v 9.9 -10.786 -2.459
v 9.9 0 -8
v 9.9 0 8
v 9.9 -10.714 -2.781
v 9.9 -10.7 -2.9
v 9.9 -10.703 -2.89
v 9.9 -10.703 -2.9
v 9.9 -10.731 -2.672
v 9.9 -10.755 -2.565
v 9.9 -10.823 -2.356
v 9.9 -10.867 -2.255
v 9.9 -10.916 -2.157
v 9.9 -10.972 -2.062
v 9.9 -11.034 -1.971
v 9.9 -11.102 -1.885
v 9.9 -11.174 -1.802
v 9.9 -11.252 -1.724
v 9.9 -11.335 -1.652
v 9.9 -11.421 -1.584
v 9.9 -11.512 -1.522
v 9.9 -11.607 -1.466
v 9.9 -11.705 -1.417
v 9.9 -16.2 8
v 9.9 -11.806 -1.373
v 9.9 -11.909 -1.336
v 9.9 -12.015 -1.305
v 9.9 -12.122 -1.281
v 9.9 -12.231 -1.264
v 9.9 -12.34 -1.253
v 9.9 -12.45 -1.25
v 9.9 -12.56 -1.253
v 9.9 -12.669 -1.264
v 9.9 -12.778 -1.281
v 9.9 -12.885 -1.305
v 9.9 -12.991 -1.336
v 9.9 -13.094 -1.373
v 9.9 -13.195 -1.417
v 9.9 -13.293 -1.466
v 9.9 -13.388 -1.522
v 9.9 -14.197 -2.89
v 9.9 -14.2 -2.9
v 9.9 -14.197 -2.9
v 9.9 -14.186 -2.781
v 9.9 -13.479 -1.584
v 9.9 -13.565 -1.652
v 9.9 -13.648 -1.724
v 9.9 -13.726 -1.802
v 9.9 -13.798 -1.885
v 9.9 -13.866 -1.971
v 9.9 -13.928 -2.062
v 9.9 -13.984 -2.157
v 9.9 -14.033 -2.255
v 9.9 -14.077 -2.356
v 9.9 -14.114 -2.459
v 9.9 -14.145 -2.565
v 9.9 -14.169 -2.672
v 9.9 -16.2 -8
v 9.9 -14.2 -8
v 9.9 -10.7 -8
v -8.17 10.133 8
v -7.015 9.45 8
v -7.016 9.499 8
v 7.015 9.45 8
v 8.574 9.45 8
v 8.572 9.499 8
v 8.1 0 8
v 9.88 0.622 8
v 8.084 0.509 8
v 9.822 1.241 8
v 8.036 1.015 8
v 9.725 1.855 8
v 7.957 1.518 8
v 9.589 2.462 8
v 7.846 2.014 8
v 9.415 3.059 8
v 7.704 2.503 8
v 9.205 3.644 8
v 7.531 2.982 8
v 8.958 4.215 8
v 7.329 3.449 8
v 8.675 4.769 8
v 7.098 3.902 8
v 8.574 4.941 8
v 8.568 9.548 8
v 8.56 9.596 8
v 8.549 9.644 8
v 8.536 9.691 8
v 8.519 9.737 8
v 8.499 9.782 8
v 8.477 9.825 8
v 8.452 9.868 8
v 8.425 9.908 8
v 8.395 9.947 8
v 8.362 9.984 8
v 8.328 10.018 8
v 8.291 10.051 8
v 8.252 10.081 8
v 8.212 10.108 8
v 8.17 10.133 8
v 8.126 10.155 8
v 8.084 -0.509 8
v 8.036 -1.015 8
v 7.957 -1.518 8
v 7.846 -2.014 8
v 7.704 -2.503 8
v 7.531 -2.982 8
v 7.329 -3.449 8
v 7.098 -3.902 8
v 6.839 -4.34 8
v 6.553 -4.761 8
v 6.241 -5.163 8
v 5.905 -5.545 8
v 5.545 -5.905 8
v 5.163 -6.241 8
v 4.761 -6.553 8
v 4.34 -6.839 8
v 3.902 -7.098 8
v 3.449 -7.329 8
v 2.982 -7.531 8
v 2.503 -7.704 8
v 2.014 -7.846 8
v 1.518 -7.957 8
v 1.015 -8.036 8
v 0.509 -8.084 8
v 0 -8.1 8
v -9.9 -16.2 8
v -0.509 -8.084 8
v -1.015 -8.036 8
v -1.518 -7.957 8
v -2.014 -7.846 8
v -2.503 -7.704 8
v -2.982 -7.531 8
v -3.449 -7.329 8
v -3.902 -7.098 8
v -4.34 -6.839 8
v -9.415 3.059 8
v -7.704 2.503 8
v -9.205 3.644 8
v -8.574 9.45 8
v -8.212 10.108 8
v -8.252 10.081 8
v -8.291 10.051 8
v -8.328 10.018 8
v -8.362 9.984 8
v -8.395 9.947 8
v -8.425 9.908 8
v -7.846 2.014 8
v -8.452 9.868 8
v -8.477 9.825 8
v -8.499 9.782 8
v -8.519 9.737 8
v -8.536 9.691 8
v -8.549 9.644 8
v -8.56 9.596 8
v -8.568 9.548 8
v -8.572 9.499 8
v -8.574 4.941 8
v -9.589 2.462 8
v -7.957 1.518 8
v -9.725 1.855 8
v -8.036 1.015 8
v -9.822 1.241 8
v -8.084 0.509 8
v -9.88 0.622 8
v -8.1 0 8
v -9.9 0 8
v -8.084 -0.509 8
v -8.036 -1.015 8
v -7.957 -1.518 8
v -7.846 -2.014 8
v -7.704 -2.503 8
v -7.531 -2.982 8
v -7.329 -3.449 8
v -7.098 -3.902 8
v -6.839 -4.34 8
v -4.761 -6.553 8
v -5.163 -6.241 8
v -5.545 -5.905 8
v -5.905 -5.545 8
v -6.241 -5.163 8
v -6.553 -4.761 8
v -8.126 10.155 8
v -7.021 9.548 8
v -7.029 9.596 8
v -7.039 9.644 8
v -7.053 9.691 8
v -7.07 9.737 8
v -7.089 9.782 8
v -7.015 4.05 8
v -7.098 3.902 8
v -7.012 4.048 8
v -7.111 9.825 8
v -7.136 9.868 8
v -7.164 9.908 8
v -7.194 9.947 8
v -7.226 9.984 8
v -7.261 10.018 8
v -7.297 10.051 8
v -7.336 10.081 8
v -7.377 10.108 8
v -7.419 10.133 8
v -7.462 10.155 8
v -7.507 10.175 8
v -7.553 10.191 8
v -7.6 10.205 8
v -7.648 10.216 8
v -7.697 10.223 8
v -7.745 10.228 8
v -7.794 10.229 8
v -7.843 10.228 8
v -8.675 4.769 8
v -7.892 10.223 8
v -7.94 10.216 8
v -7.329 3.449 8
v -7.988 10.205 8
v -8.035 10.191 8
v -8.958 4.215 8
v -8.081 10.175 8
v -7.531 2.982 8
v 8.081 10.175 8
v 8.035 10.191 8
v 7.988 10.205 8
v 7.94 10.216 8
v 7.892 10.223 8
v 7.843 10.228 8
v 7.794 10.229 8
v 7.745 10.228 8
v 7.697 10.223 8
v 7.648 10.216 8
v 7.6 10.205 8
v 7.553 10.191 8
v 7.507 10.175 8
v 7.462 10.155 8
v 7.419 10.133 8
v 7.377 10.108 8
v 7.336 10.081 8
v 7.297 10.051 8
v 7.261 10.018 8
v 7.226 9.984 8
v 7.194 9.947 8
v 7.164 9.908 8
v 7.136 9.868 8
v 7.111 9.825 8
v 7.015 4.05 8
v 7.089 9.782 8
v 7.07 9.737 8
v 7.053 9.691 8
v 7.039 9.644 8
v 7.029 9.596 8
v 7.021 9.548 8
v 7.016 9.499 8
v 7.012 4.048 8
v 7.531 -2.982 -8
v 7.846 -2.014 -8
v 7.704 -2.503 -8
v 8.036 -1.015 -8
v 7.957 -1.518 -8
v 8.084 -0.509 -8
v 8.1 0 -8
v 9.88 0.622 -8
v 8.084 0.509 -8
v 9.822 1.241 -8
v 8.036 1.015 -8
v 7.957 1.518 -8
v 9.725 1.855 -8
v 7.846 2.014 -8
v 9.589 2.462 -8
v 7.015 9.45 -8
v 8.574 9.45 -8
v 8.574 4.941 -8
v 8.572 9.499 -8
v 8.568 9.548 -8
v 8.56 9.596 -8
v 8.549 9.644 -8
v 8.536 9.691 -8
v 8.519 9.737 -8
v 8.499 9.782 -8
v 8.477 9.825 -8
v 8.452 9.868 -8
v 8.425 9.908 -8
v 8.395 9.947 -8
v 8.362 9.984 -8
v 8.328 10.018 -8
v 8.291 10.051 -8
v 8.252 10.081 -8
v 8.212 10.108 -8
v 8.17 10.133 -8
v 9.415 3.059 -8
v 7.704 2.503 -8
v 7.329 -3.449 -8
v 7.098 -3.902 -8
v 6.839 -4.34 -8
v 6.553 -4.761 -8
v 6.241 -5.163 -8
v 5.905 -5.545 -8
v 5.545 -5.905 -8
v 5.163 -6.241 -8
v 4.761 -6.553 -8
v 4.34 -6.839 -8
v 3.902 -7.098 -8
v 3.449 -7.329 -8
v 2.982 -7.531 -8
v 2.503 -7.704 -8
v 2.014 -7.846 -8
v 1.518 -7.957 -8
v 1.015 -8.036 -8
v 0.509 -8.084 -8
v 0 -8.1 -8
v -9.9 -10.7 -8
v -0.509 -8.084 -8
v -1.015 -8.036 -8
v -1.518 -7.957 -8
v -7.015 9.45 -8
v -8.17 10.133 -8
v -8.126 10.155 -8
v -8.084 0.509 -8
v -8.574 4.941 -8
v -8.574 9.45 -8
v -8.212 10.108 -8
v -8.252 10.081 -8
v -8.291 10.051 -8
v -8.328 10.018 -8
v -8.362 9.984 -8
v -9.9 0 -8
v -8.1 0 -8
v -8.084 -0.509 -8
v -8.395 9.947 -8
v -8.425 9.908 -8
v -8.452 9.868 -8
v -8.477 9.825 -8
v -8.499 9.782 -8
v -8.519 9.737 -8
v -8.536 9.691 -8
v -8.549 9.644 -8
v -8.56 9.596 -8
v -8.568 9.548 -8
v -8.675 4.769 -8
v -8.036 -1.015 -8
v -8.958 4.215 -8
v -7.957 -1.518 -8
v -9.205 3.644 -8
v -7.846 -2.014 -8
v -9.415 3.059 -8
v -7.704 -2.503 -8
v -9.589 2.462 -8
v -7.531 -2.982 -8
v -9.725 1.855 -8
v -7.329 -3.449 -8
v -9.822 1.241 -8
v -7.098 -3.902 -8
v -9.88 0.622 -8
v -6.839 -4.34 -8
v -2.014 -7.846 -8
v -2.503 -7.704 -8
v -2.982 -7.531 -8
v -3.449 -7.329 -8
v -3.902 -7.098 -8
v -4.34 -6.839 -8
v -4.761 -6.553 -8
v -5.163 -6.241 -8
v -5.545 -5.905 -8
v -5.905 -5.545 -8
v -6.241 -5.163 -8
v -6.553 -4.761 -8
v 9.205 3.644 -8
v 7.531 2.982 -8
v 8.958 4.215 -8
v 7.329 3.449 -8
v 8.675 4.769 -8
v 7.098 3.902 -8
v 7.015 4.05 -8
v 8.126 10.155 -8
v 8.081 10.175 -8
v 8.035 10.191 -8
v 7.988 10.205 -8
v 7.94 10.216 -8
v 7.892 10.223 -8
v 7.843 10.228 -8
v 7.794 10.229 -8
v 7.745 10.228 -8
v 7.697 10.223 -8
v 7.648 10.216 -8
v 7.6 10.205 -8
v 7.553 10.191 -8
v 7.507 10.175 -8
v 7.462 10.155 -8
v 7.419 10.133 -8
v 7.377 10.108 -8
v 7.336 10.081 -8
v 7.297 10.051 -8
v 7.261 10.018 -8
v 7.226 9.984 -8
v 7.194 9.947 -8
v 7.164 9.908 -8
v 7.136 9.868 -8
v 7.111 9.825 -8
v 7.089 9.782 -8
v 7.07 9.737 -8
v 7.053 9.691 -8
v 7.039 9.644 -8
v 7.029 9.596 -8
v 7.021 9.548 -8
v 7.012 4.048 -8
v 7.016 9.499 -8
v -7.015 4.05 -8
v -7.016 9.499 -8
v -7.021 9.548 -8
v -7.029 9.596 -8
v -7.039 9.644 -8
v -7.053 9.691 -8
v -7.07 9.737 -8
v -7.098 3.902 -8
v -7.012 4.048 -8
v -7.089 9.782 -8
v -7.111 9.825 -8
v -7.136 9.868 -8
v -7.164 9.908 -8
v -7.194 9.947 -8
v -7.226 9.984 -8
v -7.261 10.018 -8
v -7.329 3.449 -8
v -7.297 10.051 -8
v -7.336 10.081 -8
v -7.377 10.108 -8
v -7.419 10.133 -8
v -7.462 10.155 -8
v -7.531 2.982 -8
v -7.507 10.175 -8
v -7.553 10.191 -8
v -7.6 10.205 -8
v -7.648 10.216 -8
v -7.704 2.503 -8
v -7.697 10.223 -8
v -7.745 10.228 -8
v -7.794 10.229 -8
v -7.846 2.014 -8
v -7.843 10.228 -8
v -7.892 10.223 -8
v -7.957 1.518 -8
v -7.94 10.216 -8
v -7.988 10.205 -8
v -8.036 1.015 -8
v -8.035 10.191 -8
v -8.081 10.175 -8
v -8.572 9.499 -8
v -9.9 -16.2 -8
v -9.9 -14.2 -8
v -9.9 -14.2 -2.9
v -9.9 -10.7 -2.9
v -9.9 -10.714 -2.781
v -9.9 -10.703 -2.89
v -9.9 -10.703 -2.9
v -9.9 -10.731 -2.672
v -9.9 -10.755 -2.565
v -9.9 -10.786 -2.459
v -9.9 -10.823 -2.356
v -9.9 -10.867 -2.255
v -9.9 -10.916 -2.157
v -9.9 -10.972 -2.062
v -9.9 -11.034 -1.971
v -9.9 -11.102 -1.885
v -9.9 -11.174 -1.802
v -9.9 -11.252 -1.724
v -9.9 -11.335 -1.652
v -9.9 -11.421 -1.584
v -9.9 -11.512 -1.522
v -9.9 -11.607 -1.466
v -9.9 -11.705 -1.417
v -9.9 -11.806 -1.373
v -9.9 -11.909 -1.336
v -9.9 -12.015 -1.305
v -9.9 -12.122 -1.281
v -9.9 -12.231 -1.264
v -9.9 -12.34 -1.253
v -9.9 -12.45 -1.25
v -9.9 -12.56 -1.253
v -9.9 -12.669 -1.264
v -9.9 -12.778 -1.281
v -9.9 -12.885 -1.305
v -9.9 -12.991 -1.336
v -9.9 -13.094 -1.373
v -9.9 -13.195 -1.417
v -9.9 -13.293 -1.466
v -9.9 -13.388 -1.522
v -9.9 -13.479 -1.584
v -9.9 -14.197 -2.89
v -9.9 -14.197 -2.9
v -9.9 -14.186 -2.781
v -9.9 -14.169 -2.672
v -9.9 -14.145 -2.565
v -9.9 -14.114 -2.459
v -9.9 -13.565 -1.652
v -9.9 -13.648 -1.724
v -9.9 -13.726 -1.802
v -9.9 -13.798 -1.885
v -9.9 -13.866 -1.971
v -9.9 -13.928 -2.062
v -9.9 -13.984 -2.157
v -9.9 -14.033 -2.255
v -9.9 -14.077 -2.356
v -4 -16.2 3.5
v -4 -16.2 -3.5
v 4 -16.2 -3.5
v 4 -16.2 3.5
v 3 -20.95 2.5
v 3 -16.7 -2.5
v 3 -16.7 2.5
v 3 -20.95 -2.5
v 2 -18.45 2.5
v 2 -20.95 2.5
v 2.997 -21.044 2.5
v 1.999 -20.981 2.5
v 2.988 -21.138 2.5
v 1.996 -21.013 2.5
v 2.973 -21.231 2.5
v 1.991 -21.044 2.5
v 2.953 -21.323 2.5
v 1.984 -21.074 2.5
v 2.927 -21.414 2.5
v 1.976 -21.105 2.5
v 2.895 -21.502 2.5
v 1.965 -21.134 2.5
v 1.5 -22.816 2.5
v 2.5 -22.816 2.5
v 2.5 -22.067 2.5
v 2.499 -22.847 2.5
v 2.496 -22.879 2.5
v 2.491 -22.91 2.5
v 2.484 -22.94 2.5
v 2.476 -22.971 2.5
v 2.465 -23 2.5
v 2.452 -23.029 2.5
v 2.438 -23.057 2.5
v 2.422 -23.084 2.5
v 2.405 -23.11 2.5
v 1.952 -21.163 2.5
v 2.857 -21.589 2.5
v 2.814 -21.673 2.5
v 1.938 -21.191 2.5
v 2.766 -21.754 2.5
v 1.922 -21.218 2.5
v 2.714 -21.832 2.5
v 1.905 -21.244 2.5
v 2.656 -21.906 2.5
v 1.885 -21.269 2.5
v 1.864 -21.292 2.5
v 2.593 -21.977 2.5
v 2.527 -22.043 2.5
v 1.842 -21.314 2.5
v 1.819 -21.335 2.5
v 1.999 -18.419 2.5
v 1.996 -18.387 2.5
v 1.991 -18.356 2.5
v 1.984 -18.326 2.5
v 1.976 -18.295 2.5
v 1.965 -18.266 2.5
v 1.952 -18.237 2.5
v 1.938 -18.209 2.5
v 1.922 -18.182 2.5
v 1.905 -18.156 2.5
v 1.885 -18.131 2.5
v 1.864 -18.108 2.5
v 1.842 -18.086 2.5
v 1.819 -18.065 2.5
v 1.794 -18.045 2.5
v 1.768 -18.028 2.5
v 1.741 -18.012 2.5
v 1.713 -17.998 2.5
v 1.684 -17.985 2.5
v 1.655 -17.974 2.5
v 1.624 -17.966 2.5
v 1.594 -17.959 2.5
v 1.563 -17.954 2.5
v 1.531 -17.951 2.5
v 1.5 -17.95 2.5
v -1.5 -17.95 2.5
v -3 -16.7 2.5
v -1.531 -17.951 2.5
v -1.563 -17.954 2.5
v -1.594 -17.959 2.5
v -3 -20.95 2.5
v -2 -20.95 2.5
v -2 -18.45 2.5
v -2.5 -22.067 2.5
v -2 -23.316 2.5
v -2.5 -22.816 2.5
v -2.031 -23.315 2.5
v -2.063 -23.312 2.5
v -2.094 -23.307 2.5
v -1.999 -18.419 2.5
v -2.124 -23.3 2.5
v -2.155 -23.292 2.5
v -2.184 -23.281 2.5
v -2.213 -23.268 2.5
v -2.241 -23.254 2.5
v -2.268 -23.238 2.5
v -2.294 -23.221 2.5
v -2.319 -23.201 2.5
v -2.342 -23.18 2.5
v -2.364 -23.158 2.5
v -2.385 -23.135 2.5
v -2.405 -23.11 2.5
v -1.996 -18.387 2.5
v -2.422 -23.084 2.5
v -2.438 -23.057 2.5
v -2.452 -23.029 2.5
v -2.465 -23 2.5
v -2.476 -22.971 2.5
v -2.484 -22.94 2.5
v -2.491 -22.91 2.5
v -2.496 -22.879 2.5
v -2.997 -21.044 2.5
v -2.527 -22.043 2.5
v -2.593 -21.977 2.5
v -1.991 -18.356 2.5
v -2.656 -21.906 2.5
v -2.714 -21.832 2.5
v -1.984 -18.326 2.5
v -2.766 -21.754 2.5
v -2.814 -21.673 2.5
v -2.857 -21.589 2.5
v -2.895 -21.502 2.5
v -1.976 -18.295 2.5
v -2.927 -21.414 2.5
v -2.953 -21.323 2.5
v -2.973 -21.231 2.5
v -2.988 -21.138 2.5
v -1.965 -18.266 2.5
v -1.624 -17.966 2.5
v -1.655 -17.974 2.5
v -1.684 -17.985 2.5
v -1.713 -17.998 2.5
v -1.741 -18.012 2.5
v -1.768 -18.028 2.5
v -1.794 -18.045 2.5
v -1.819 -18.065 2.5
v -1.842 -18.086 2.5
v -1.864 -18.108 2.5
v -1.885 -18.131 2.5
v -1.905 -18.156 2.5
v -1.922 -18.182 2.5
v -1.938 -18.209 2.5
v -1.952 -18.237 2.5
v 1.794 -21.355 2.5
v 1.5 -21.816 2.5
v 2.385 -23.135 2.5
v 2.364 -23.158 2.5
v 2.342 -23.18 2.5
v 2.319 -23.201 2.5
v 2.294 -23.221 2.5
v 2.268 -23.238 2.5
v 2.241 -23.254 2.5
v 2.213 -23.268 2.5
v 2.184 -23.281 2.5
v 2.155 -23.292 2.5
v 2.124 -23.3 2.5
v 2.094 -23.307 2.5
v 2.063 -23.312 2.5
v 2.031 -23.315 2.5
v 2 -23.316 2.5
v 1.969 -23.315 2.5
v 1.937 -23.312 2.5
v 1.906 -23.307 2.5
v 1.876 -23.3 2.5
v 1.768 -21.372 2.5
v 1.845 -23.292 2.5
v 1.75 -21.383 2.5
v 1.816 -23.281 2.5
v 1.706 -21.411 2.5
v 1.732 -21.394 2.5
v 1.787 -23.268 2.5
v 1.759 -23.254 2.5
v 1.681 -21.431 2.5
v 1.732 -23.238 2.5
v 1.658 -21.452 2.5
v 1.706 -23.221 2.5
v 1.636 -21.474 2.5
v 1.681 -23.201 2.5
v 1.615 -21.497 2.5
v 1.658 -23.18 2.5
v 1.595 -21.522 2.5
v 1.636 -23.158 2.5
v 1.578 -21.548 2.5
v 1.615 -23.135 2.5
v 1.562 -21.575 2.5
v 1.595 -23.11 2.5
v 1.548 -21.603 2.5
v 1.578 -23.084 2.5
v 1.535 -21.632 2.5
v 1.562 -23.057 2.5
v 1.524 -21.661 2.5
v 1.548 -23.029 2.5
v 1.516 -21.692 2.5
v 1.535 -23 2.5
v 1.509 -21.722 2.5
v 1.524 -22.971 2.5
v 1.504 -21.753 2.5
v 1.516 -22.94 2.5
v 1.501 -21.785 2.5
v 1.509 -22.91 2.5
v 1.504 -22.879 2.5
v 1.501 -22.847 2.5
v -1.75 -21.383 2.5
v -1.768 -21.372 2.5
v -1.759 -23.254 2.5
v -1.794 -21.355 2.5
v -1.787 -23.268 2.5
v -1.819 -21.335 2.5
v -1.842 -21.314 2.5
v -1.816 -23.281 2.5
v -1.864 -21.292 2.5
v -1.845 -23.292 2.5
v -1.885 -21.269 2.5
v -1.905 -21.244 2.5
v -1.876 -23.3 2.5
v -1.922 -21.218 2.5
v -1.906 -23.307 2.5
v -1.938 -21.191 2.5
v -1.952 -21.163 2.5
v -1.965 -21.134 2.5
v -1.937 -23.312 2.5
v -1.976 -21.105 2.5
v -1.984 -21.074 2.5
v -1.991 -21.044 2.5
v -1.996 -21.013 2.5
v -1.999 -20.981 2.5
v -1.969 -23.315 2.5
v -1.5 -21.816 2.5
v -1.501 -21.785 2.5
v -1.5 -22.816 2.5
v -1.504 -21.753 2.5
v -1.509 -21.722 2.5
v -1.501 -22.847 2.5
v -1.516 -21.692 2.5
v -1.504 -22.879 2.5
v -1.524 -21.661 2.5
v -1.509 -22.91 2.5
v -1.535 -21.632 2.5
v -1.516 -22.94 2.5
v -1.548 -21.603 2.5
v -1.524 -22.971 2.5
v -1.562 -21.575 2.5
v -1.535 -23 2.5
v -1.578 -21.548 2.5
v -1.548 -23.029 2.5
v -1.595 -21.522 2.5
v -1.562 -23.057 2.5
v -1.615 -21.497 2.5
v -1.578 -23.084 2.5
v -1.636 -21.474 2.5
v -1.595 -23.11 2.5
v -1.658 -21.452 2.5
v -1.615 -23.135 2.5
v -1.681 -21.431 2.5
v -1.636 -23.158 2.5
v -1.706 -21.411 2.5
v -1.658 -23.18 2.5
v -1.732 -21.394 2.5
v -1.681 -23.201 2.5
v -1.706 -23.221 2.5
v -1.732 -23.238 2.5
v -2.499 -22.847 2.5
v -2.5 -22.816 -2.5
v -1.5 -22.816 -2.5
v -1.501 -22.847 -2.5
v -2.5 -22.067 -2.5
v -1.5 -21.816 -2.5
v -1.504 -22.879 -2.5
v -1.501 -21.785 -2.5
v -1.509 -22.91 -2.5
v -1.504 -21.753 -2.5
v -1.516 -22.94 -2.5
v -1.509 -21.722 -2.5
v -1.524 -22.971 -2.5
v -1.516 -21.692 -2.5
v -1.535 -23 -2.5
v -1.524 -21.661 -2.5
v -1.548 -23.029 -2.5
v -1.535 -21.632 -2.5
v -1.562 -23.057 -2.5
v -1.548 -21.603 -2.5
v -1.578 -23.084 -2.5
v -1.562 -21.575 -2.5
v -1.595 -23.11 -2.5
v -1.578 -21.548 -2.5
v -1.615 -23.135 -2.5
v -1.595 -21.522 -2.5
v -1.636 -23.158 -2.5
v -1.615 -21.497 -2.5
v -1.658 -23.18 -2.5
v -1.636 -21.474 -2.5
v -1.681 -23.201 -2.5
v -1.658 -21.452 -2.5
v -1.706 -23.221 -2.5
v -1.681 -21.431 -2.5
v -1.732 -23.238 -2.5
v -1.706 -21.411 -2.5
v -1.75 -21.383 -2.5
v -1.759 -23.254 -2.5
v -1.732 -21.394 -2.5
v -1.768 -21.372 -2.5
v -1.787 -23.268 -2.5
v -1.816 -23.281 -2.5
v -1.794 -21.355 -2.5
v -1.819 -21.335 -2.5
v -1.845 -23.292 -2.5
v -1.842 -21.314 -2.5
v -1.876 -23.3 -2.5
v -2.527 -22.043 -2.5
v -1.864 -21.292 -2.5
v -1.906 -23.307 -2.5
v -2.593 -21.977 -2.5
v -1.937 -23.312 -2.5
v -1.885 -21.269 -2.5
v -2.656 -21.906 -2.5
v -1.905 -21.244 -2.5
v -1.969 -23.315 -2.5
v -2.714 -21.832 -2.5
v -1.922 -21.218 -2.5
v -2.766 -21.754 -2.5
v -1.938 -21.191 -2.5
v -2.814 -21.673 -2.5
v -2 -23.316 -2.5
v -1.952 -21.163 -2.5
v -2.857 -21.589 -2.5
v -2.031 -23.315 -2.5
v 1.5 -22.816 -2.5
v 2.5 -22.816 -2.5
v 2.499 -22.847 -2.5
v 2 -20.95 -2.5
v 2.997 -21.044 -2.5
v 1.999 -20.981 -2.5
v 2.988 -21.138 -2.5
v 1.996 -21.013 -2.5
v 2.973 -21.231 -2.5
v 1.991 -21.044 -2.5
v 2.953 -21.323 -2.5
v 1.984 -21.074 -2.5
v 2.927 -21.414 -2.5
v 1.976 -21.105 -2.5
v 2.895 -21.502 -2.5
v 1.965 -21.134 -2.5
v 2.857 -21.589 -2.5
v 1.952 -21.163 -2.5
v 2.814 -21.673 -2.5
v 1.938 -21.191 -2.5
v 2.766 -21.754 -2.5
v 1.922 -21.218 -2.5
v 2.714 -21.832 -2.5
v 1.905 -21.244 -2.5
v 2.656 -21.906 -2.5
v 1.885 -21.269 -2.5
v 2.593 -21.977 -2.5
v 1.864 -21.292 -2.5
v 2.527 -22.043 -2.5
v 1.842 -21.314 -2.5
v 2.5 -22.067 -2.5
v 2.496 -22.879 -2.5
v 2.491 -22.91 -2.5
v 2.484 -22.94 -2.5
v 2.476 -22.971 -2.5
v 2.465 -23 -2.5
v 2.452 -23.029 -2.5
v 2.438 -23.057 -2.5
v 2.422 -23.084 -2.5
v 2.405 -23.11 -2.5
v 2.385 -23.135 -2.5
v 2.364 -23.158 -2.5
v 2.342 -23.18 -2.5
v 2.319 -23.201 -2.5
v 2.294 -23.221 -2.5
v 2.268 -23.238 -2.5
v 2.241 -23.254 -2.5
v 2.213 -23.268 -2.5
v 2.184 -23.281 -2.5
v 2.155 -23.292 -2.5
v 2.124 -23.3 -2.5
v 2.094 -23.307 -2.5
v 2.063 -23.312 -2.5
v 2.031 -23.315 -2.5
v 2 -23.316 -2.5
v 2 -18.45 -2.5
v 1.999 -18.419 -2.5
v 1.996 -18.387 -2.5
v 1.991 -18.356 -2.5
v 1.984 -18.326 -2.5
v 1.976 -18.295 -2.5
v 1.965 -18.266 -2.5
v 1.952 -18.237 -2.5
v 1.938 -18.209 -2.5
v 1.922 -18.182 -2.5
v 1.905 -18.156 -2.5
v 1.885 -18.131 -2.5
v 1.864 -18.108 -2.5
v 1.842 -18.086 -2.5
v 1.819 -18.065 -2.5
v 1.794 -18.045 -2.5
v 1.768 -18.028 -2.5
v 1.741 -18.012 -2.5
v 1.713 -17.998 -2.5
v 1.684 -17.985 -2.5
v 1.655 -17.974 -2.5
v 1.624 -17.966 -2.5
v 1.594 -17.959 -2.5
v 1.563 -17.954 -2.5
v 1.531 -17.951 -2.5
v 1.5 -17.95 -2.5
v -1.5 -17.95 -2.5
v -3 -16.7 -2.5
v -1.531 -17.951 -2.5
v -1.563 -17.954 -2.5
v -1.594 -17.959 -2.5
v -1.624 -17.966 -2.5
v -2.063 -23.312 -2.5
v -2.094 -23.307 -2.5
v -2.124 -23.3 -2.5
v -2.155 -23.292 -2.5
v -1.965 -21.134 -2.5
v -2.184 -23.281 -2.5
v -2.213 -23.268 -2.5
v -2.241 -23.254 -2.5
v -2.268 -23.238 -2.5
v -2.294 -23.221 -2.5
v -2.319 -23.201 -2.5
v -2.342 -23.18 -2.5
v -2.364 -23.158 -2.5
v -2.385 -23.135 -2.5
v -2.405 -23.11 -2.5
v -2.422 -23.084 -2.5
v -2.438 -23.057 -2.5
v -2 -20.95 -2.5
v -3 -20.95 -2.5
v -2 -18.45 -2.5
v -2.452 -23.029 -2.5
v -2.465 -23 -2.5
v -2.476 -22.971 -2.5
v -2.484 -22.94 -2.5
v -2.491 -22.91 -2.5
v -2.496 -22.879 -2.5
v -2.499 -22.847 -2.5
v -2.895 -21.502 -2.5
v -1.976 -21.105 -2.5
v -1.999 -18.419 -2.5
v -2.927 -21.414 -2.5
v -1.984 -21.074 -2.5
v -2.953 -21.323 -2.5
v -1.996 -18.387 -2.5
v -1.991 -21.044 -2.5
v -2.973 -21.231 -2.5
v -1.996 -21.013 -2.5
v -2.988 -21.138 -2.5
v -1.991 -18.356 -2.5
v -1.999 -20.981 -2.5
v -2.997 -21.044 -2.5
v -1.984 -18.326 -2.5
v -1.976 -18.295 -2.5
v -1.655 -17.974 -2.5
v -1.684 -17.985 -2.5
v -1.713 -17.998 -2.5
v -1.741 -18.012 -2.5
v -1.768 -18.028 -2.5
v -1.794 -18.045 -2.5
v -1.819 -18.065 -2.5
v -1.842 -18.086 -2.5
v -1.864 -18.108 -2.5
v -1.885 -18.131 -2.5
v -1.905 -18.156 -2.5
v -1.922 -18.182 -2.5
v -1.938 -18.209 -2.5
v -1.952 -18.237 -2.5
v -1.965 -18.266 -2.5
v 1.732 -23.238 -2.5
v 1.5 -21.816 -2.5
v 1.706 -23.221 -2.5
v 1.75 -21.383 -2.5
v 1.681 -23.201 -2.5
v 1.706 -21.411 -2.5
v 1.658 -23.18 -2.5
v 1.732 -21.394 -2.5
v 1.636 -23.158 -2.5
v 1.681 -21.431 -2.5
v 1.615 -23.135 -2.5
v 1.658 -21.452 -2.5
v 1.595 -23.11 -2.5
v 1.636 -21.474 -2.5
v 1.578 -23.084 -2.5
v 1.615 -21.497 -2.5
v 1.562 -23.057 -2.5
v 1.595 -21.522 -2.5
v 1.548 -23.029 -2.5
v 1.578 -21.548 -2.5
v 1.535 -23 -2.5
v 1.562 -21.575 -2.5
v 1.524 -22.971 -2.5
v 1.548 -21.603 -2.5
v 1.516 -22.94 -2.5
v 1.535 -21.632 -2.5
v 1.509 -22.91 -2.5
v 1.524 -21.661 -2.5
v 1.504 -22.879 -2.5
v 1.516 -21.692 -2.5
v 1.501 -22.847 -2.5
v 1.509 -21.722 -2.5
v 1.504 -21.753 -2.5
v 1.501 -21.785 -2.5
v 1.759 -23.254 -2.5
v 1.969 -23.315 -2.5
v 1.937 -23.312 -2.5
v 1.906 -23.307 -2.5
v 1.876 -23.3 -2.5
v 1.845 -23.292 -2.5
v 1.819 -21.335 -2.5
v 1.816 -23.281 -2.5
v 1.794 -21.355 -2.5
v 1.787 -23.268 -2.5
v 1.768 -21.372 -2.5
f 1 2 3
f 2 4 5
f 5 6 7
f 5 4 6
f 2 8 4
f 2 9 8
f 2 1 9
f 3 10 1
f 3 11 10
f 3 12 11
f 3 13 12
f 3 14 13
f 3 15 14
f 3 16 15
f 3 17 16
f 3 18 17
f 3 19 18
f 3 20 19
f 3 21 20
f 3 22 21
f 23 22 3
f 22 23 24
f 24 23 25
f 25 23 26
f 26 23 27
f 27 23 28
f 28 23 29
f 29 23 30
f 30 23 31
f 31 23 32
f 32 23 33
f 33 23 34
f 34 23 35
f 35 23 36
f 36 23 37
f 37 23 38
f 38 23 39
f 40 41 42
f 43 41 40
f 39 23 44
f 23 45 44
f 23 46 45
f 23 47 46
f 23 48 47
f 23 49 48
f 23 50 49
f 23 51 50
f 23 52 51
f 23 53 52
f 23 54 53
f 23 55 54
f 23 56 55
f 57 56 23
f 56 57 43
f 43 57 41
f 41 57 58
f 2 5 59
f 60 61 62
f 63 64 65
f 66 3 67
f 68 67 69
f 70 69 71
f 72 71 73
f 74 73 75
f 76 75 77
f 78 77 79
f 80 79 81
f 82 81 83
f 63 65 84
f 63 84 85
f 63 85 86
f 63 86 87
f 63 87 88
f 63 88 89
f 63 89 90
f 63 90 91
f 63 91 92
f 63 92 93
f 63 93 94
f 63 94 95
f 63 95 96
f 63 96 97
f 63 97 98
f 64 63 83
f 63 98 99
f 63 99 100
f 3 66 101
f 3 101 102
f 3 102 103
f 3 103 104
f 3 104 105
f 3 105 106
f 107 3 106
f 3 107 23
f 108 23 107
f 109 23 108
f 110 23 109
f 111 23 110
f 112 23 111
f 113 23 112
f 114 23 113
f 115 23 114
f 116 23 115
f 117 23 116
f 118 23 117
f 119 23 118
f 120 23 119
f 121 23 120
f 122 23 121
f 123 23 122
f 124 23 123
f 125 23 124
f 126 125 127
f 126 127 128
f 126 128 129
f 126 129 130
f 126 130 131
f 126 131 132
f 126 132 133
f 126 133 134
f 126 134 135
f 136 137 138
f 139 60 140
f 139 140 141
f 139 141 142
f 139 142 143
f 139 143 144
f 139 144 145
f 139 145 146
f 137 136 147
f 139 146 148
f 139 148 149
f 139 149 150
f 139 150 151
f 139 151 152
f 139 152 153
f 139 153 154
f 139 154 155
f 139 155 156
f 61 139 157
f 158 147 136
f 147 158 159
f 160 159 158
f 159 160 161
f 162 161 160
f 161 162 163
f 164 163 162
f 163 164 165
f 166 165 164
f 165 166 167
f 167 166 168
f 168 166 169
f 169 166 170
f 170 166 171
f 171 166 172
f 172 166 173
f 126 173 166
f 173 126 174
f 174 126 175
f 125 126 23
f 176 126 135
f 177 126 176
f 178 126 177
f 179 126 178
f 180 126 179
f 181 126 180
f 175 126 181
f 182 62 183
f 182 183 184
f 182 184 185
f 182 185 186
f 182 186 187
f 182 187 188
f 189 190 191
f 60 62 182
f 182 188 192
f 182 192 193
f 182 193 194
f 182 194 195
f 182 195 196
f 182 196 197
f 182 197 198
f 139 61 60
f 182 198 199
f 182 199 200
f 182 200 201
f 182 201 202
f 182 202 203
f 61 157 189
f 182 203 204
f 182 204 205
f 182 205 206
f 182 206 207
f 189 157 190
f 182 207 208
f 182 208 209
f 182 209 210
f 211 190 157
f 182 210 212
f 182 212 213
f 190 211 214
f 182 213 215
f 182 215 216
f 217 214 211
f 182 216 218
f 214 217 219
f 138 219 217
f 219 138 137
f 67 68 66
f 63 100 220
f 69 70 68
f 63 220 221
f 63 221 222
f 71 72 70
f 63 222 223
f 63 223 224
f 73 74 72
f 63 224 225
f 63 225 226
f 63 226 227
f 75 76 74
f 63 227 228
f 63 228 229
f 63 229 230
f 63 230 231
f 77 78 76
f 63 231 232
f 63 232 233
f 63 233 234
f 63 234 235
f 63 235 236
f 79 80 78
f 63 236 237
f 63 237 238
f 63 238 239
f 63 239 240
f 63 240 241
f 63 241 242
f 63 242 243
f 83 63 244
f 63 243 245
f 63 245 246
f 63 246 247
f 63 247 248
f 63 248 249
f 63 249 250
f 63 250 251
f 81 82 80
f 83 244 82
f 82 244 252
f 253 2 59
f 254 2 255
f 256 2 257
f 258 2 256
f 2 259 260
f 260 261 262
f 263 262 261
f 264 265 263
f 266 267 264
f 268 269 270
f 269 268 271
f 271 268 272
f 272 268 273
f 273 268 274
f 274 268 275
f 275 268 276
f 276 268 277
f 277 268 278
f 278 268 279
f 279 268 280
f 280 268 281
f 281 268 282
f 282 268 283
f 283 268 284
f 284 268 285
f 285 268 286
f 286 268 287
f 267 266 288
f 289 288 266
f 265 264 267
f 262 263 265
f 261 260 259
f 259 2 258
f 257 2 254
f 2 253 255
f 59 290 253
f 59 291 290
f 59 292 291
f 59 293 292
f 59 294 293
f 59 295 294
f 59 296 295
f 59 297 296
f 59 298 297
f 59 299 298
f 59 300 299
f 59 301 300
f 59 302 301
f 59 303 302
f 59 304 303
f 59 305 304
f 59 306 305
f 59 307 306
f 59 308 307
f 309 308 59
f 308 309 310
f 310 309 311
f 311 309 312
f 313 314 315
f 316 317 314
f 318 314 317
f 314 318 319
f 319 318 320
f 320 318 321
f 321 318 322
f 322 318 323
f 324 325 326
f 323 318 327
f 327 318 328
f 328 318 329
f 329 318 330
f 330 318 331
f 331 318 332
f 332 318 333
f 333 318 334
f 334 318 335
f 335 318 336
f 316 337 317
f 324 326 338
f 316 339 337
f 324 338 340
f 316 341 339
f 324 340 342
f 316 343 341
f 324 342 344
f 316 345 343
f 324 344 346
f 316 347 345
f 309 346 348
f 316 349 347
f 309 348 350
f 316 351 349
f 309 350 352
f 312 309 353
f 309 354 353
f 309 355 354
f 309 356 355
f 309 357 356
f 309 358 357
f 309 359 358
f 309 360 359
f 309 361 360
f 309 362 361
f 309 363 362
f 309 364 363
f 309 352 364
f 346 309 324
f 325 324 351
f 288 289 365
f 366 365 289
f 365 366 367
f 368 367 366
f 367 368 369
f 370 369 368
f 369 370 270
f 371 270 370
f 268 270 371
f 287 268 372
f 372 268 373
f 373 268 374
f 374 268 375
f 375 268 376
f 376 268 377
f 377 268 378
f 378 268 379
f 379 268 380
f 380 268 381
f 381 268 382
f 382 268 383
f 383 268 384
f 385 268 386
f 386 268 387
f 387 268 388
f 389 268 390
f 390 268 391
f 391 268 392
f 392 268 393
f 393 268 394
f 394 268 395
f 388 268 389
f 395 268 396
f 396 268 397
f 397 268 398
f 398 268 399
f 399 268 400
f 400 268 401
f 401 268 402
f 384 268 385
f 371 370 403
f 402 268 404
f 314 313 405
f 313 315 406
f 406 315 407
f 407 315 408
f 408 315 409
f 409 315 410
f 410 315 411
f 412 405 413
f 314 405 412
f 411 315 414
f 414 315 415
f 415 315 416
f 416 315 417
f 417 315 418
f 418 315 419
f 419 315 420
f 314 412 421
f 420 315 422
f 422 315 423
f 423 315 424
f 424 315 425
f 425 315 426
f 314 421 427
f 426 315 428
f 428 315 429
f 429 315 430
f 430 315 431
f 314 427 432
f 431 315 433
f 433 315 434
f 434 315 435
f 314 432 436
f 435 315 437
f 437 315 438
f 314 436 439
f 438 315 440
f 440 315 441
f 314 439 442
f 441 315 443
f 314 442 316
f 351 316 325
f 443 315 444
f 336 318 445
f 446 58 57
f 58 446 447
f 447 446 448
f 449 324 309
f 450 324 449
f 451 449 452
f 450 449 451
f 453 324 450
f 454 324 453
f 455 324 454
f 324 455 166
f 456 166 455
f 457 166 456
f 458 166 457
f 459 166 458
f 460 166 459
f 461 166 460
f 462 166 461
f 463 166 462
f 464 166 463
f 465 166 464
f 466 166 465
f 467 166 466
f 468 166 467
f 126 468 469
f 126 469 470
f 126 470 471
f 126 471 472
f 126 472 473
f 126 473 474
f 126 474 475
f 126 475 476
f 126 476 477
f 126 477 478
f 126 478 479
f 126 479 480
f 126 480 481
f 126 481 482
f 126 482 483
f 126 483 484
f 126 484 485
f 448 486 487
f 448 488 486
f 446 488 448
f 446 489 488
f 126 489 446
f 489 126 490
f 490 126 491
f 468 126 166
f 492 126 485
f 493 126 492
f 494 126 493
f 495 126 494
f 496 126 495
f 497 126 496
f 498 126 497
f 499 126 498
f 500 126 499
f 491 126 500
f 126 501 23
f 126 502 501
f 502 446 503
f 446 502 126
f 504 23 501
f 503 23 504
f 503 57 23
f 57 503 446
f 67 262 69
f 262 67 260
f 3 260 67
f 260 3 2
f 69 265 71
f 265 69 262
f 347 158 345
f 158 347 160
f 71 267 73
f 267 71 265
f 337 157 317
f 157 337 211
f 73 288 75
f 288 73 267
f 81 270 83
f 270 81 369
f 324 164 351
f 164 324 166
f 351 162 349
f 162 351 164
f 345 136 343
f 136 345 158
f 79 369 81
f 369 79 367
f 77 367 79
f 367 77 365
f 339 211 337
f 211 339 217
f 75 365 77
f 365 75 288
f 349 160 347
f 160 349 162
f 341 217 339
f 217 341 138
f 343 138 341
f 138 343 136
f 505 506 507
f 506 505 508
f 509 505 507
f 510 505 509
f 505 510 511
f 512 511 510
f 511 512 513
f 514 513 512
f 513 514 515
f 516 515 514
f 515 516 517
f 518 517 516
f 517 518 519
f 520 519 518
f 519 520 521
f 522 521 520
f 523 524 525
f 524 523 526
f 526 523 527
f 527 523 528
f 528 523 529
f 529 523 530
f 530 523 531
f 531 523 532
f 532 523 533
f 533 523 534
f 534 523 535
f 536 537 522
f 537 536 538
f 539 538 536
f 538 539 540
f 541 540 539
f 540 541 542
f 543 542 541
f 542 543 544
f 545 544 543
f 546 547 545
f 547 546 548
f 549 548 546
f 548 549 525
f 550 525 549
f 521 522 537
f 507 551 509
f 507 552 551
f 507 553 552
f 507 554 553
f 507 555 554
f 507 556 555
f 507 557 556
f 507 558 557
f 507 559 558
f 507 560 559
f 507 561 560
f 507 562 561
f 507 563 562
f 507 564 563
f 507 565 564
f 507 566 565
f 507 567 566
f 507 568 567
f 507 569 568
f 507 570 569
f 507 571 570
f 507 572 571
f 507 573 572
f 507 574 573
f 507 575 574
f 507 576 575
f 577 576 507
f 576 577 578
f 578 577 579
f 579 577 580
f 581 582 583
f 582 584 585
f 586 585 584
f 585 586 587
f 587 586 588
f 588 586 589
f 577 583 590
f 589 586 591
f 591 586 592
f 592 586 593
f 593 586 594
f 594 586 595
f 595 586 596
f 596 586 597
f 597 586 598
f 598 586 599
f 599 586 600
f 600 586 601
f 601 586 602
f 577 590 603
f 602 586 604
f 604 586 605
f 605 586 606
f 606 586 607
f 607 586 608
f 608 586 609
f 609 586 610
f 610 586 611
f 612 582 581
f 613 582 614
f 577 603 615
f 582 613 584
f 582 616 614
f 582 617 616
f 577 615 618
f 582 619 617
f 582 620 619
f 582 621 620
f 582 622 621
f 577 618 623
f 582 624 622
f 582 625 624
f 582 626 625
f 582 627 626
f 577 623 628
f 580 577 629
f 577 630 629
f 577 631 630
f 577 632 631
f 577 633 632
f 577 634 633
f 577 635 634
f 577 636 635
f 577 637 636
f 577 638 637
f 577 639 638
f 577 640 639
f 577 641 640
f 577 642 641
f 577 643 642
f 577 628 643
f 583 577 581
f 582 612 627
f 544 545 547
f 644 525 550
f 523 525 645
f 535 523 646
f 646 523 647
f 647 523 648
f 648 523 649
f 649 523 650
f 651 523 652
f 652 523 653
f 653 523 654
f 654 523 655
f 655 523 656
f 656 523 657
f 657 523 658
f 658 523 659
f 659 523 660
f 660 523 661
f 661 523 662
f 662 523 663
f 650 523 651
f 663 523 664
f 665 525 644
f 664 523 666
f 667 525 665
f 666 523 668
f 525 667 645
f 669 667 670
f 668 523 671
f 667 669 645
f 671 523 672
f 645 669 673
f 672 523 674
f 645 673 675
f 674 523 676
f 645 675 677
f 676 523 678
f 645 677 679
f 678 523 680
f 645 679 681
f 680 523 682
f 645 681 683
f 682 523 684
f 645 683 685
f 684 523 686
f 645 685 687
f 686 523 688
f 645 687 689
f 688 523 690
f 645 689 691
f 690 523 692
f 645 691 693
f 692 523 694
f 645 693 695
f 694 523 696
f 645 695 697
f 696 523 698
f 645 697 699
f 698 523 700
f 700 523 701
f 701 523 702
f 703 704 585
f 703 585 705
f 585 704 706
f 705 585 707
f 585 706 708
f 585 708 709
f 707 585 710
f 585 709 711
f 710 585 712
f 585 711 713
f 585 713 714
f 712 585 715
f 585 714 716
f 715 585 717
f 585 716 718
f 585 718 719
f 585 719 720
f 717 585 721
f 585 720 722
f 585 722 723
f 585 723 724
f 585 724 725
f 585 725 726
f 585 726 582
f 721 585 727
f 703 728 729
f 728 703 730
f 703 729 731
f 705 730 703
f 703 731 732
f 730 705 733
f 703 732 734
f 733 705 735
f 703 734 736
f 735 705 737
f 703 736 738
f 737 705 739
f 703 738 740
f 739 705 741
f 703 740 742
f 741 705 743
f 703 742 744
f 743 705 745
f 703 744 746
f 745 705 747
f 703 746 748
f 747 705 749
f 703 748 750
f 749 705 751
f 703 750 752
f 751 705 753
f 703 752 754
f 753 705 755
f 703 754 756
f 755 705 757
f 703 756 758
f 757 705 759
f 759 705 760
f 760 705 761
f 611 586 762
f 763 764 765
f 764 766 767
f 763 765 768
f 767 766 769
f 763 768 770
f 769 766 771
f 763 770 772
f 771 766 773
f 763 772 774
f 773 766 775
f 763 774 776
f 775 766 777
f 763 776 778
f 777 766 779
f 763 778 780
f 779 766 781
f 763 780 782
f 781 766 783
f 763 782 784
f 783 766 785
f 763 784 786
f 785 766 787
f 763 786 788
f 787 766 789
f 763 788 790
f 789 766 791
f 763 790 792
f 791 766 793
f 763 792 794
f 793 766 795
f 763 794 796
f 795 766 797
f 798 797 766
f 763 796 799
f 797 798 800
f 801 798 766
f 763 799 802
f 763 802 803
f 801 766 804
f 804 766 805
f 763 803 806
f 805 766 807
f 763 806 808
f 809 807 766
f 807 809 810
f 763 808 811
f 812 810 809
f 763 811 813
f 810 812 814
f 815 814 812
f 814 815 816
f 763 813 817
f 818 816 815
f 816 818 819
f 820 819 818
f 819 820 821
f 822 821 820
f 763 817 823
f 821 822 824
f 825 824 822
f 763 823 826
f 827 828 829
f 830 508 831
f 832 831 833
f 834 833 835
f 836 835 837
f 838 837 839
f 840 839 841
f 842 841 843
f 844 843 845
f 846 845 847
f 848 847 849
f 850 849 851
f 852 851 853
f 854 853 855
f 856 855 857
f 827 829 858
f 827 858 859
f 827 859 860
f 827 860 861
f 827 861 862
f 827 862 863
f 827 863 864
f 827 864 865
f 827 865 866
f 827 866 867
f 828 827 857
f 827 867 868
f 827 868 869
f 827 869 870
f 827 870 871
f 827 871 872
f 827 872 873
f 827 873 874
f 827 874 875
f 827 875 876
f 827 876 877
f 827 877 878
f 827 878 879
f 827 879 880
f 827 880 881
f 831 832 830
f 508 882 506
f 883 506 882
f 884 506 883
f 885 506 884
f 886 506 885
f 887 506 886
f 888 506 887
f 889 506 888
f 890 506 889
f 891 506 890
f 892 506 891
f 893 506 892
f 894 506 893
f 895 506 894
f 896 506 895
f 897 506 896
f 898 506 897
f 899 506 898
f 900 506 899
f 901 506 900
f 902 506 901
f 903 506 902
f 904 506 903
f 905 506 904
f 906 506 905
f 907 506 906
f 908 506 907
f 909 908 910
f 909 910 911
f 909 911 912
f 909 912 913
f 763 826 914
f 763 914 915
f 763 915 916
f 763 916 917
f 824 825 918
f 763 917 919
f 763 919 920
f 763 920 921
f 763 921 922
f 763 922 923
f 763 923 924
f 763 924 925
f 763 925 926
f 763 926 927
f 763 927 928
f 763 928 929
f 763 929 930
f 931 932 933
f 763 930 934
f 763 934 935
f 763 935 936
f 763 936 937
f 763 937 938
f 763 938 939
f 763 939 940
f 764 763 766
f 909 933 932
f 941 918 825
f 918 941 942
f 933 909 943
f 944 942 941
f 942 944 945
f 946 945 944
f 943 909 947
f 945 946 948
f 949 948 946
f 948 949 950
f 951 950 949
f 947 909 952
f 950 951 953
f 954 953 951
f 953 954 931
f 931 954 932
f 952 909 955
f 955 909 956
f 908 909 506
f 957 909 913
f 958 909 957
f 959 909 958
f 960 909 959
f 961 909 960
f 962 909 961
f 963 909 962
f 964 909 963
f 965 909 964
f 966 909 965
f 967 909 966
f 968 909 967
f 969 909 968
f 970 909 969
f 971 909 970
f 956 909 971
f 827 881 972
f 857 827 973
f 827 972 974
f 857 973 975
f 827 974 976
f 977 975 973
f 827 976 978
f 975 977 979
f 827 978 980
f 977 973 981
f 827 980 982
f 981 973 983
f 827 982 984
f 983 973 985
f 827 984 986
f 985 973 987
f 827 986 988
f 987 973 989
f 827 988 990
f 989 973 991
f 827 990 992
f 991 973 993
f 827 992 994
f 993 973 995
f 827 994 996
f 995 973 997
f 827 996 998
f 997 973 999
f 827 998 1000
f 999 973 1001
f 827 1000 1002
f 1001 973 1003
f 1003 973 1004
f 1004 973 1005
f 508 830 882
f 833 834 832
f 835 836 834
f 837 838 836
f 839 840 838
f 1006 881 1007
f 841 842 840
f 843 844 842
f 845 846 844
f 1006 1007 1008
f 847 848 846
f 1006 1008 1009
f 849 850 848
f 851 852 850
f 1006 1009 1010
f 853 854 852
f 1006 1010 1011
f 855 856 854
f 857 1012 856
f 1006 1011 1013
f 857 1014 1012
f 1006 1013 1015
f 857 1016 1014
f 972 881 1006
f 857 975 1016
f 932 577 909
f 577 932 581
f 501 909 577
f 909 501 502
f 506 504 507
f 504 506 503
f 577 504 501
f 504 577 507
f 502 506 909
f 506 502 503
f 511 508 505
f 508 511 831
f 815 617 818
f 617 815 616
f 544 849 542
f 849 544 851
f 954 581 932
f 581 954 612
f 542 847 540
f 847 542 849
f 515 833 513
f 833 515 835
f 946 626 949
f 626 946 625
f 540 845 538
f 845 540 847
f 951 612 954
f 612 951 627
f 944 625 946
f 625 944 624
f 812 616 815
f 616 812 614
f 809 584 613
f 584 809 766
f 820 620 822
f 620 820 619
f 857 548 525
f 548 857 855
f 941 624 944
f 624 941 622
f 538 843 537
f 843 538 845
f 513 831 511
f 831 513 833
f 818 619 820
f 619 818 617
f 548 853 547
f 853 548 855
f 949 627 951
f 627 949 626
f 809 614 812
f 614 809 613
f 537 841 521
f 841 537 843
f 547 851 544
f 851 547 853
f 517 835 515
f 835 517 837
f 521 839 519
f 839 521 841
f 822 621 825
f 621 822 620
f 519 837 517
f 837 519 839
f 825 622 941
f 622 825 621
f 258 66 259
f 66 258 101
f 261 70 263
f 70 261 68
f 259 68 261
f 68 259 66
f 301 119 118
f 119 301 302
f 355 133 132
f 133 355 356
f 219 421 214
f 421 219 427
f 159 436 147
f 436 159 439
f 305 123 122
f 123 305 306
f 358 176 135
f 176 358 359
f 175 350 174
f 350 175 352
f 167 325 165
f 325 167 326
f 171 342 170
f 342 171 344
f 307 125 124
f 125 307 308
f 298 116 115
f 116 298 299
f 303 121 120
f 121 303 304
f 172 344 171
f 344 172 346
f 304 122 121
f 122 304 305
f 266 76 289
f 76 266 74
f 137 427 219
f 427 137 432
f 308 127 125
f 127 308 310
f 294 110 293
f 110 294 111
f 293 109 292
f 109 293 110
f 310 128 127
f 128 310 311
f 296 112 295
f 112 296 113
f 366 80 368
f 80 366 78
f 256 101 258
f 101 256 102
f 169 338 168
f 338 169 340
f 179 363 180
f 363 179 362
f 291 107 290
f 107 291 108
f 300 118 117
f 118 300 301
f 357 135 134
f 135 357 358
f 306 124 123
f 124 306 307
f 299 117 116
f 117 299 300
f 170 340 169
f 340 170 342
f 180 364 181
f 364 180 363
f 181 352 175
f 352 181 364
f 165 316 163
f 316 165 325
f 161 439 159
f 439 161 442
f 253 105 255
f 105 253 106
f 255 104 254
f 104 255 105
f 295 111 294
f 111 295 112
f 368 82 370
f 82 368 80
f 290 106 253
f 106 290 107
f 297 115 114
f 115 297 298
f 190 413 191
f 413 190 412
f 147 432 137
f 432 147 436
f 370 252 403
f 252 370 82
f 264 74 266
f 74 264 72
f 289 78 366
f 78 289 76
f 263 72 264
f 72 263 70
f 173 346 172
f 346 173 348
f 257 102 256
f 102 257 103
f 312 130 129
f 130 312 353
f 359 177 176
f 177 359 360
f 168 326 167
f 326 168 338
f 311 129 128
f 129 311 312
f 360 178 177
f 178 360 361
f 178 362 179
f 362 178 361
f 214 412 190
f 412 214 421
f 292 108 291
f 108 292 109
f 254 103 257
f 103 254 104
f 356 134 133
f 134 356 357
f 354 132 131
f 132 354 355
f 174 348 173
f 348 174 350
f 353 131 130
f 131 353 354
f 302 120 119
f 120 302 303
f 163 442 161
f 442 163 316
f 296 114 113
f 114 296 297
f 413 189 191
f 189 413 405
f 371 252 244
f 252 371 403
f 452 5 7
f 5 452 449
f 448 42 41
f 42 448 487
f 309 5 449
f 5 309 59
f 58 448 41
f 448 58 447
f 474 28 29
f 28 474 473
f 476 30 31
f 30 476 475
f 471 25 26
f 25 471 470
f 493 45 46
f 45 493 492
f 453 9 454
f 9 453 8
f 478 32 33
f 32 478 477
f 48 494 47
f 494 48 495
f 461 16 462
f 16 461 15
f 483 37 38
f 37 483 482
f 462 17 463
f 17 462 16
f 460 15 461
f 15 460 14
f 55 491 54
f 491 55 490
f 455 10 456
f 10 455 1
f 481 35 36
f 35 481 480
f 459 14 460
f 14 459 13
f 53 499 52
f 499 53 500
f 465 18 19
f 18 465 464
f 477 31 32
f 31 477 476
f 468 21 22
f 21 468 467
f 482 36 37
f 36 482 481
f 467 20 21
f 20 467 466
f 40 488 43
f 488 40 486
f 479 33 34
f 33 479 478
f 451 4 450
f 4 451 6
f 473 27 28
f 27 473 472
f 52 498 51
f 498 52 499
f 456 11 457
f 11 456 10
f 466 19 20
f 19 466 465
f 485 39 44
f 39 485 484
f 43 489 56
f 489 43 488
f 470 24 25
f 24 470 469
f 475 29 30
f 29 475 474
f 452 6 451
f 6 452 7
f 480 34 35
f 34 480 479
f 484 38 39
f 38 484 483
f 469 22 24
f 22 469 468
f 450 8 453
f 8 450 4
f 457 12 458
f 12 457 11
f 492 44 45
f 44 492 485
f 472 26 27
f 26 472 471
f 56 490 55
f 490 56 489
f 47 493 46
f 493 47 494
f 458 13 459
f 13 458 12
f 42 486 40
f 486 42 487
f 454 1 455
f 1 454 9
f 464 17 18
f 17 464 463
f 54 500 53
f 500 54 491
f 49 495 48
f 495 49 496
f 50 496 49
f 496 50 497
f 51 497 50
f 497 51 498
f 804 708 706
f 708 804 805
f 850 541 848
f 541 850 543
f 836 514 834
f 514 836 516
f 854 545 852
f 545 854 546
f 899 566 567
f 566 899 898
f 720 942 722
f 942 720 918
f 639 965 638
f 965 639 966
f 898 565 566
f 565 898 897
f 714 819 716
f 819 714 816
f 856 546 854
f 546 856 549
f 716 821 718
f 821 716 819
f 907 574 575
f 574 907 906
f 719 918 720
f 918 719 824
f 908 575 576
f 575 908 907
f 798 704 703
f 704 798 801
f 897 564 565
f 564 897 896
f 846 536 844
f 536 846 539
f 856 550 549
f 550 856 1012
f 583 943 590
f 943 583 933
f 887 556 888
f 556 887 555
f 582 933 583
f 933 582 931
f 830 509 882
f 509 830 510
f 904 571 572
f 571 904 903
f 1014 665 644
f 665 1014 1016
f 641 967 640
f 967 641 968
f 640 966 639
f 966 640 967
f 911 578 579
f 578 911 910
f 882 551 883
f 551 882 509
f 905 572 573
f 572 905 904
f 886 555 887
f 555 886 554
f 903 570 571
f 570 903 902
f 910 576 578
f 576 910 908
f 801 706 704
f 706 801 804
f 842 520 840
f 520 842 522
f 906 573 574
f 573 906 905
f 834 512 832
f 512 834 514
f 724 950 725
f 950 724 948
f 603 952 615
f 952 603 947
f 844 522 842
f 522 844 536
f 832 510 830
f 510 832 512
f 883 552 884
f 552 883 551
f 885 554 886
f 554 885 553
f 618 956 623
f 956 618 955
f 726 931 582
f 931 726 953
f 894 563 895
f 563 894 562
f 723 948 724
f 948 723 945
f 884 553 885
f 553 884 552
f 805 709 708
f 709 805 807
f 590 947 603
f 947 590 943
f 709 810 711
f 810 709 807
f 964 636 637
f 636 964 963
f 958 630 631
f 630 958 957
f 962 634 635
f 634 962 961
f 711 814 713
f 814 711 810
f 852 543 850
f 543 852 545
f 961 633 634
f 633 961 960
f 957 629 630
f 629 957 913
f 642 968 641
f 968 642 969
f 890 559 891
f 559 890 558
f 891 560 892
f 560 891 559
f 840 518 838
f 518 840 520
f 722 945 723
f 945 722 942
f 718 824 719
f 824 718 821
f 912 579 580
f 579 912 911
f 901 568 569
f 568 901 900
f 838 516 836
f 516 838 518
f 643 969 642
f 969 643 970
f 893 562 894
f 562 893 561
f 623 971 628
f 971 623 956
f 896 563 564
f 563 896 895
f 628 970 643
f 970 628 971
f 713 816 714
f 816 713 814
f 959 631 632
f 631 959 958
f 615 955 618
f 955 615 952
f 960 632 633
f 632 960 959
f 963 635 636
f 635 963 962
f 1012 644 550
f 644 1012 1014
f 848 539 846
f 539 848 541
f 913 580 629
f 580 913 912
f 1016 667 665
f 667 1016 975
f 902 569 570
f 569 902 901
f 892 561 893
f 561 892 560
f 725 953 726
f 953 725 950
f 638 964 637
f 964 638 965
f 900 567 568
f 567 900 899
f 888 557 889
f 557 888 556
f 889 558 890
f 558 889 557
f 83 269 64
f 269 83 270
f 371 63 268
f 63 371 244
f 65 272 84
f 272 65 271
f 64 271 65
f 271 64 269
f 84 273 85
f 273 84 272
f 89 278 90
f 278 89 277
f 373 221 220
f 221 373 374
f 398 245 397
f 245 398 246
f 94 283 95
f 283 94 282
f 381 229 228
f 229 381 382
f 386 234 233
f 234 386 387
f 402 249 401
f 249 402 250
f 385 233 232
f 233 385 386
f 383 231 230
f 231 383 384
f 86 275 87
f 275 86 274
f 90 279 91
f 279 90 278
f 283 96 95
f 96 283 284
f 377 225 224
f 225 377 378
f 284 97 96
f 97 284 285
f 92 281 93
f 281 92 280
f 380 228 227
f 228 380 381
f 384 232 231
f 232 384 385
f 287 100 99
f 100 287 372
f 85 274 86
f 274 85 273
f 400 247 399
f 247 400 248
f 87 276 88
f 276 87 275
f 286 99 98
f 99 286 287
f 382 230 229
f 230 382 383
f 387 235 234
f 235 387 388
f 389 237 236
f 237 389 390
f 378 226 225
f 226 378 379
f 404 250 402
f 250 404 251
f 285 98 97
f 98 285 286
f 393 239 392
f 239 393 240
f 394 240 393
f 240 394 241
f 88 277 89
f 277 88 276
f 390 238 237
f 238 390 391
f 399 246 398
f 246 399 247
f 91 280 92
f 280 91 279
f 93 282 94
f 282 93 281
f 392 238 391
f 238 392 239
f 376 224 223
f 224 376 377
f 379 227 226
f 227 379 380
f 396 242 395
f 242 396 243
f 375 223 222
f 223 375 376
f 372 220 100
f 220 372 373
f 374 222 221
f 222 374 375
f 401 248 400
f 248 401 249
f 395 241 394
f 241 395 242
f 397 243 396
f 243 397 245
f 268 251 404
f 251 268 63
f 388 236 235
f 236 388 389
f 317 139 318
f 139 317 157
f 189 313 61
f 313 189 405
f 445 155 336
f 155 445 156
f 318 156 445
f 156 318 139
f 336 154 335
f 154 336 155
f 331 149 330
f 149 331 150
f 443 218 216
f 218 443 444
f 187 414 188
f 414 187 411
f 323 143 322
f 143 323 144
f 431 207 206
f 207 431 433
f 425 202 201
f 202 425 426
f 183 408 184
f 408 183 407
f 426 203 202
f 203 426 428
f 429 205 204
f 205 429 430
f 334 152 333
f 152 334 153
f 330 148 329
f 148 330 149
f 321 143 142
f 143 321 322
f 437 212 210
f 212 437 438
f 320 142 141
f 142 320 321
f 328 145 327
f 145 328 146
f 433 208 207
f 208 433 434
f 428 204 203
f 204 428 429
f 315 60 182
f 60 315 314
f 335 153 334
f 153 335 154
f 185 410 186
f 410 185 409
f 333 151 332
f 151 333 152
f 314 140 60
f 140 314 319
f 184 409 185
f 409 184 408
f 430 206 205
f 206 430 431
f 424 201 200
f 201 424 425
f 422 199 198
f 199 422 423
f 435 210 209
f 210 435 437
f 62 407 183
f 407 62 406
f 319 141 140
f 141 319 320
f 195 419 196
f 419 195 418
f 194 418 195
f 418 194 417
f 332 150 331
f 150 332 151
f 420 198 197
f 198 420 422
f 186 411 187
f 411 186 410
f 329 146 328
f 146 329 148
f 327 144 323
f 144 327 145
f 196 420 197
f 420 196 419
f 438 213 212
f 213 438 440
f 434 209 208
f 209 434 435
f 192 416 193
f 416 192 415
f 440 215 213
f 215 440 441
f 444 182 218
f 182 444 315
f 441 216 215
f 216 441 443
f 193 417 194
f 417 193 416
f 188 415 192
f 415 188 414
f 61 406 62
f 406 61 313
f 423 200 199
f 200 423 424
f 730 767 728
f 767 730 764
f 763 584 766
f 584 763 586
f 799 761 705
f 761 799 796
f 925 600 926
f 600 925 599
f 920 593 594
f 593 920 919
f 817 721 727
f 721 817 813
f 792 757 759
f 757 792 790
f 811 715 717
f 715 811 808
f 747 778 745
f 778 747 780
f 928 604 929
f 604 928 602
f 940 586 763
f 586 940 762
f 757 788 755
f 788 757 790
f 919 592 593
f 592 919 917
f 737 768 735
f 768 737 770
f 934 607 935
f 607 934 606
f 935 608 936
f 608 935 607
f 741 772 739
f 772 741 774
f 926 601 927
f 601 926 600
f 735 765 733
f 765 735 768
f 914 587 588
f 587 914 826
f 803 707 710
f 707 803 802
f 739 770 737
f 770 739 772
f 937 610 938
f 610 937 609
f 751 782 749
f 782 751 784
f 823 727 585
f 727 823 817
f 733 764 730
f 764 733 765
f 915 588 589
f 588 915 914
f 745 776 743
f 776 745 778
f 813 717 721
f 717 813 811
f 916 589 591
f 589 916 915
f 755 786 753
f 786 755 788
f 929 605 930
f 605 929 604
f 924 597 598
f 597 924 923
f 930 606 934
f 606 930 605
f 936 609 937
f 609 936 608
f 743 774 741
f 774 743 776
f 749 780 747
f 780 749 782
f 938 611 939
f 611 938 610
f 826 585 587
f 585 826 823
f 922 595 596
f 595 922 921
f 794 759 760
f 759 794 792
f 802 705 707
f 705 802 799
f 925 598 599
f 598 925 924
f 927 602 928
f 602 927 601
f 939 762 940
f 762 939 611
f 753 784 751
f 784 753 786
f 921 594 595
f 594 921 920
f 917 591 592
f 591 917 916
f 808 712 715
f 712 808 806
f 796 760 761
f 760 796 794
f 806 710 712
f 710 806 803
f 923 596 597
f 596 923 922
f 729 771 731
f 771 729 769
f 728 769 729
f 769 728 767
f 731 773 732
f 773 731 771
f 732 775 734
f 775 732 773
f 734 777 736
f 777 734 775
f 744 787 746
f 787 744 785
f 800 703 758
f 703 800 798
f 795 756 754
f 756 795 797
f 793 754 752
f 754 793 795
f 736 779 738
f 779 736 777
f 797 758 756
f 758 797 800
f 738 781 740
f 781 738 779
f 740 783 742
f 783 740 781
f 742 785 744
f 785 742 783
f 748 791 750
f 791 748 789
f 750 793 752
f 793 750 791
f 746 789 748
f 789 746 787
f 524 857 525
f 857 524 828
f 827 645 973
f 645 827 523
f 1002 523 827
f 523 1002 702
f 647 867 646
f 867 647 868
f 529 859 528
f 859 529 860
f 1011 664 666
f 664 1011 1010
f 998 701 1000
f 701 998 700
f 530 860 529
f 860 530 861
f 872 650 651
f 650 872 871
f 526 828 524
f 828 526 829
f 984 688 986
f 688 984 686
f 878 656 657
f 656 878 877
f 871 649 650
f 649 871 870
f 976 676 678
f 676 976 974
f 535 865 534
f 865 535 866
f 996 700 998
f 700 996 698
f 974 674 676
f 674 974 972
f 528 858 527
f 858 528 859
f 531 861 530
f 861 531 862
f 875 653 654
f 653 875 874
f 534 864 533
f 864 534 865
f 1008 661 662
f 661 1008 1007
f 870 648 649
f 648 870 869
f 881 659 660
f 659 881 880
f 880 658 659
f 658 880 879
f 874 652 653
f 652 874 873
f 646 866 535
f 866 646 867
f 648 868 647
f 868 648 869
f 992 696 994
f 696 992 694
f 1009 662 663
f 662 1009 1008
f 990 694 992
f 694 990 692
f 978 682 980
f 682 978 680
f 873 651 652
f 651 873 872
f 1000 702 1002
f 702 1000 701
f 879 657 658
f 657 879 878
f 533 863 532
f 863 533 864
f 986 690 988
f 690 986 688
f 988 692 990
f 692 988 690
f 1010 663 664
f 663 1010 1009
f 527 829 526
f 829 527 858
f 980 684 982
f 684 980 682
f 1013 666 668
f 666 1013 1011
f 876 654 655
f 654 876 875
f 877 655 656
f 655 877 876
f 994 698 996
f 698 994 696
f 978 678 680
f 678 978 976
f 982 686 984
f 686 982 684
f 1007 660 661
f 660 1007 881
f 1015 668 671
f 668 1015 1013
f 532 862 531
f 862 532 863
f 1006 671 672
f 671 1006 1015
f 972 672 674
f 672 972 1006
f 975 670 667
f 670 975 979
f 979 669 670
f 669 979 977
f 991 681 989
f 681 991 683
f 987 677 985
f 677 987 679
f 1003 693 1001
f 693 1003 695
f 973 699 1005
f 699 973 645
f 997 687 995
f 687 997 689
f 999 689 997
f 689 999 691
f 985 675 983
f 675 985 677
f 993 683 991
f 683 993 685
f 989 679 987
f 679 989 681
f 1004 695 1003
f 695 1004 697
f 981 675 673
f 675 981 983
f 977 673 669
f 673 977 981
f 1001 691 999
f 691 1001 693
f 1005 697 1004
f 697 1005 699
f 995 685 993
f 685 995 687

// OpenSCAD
//-- Syringe Holder
//-- Ariel Burman 
//-- Moorman Lab, University of Massachusetts Amherst
//-- v1.0 - April 2021

syringeD = 16.2;
T = 1.8;
angle = 60;
$fn = 100;
slot = 3.5;
gripH = 5;
module syringeHolder(){
  difference(){
    union(){
      translate([0,-syringeD/2,0])cube([syringeD+2*T,syringeD,16],center=true);
      translate([0,0,0])cylinder(h=16,d=syringeD+2*T,center=true);
      translate([0,-syringeD,0])cube([6,6,gripH],center=true);
      hull(){
        translate([0,-syringeD,0])cube([6,1,gripH],center=true);
        translate([0,-syringeD+.5,0])cube([8,1,gripH+2],center=true);
      }
      translate([0,-syringeD-slot,0])hull(){
        for(i=[-1,1]) for(j=[-1,1]){
            translate([i*1.5,0,0])
            translate([0,j*(slot/2-.5),0]) cylinder(h=gripH,d=3,center=true);
        }
      }

    }
    cylinder(d=syringeD,h=16+.1,center=true,$fn=100);
    hull() {
      for (i=[0,1]) mirror([i,0,0])rotate([0,0,angle])translate([.5,syringeD/2,0])cube([1,syringeD,16.2],center=true);
      translate([0,syringeD,0])cube([1,2,16.2],center=true);
    }
    translate([0,-syringeD+slot/2+2,-8+2.5])cube([syringeD+2*T+.2,slot,5+.2],center=true);
    translate([0,-syringeD+slot/2+2,-8+5])rotate([0,90,0])cylinder(h=syringeD+2*T+.2,d=slot,center=true);
    
    translate([0,-syringeD-slot,0])hull(){
      for(i=[-1,1]) for(j=[-1,1]){
          translate([i*1.5,0,0])
          translate([0,j*(slot/2-.5),0]) cylinder(h=gripH+.1,d=1,center=true);
      }
    }
    translate([0,-syringeD-6,0])cube([3.5,6,gripH+.1],center=true);
      
  } 
  for (i=[0,1]) mirror([i,0,0]) {
    translate([(T+syringeD)/2*sin(angle),syringeD/6+syringeD/2*cos(angle),0])cube([T*sin(angle),syringeD/3,16],center=true);
    translate([(T+syringeD)/2*sin(angle),syringeD/3+syringeD/2*cos(angle),0])cylinder(d=T*sin(angle),h=16,center=true);
      
  }

  for (i=[-1,1]) {
    translate([i*2,-syringeD-5.616-.5,0])cube([1,1,gripH],center=true);
    translate([i*2,-syringeD-5.616-1,0])cylinder(d=1,h=gripH,center=true);
    translate([i*2,-syringeD-5.616,0])cylinder(d=1,h=gripH,center=true);
  }
}
syringeHolder();

//    translate([0,5.5,0])cube([1.5,14,16+.1],center=true);
//    translate([0,7.5,0])rotate([0,90,0])cylinder(d=3.06,h=10,center=true,$fn=100);
//    translate([mountSizeW/2-1,7,0])rotate([0,90,0])rotate([0,0,0])nutM3(globShow);
//    translate([-mountSizeW/2+2.95,7,0])rotate([0,90,0])rotate([0,0,0])screwM3(mountSizeW-3,globShow);
